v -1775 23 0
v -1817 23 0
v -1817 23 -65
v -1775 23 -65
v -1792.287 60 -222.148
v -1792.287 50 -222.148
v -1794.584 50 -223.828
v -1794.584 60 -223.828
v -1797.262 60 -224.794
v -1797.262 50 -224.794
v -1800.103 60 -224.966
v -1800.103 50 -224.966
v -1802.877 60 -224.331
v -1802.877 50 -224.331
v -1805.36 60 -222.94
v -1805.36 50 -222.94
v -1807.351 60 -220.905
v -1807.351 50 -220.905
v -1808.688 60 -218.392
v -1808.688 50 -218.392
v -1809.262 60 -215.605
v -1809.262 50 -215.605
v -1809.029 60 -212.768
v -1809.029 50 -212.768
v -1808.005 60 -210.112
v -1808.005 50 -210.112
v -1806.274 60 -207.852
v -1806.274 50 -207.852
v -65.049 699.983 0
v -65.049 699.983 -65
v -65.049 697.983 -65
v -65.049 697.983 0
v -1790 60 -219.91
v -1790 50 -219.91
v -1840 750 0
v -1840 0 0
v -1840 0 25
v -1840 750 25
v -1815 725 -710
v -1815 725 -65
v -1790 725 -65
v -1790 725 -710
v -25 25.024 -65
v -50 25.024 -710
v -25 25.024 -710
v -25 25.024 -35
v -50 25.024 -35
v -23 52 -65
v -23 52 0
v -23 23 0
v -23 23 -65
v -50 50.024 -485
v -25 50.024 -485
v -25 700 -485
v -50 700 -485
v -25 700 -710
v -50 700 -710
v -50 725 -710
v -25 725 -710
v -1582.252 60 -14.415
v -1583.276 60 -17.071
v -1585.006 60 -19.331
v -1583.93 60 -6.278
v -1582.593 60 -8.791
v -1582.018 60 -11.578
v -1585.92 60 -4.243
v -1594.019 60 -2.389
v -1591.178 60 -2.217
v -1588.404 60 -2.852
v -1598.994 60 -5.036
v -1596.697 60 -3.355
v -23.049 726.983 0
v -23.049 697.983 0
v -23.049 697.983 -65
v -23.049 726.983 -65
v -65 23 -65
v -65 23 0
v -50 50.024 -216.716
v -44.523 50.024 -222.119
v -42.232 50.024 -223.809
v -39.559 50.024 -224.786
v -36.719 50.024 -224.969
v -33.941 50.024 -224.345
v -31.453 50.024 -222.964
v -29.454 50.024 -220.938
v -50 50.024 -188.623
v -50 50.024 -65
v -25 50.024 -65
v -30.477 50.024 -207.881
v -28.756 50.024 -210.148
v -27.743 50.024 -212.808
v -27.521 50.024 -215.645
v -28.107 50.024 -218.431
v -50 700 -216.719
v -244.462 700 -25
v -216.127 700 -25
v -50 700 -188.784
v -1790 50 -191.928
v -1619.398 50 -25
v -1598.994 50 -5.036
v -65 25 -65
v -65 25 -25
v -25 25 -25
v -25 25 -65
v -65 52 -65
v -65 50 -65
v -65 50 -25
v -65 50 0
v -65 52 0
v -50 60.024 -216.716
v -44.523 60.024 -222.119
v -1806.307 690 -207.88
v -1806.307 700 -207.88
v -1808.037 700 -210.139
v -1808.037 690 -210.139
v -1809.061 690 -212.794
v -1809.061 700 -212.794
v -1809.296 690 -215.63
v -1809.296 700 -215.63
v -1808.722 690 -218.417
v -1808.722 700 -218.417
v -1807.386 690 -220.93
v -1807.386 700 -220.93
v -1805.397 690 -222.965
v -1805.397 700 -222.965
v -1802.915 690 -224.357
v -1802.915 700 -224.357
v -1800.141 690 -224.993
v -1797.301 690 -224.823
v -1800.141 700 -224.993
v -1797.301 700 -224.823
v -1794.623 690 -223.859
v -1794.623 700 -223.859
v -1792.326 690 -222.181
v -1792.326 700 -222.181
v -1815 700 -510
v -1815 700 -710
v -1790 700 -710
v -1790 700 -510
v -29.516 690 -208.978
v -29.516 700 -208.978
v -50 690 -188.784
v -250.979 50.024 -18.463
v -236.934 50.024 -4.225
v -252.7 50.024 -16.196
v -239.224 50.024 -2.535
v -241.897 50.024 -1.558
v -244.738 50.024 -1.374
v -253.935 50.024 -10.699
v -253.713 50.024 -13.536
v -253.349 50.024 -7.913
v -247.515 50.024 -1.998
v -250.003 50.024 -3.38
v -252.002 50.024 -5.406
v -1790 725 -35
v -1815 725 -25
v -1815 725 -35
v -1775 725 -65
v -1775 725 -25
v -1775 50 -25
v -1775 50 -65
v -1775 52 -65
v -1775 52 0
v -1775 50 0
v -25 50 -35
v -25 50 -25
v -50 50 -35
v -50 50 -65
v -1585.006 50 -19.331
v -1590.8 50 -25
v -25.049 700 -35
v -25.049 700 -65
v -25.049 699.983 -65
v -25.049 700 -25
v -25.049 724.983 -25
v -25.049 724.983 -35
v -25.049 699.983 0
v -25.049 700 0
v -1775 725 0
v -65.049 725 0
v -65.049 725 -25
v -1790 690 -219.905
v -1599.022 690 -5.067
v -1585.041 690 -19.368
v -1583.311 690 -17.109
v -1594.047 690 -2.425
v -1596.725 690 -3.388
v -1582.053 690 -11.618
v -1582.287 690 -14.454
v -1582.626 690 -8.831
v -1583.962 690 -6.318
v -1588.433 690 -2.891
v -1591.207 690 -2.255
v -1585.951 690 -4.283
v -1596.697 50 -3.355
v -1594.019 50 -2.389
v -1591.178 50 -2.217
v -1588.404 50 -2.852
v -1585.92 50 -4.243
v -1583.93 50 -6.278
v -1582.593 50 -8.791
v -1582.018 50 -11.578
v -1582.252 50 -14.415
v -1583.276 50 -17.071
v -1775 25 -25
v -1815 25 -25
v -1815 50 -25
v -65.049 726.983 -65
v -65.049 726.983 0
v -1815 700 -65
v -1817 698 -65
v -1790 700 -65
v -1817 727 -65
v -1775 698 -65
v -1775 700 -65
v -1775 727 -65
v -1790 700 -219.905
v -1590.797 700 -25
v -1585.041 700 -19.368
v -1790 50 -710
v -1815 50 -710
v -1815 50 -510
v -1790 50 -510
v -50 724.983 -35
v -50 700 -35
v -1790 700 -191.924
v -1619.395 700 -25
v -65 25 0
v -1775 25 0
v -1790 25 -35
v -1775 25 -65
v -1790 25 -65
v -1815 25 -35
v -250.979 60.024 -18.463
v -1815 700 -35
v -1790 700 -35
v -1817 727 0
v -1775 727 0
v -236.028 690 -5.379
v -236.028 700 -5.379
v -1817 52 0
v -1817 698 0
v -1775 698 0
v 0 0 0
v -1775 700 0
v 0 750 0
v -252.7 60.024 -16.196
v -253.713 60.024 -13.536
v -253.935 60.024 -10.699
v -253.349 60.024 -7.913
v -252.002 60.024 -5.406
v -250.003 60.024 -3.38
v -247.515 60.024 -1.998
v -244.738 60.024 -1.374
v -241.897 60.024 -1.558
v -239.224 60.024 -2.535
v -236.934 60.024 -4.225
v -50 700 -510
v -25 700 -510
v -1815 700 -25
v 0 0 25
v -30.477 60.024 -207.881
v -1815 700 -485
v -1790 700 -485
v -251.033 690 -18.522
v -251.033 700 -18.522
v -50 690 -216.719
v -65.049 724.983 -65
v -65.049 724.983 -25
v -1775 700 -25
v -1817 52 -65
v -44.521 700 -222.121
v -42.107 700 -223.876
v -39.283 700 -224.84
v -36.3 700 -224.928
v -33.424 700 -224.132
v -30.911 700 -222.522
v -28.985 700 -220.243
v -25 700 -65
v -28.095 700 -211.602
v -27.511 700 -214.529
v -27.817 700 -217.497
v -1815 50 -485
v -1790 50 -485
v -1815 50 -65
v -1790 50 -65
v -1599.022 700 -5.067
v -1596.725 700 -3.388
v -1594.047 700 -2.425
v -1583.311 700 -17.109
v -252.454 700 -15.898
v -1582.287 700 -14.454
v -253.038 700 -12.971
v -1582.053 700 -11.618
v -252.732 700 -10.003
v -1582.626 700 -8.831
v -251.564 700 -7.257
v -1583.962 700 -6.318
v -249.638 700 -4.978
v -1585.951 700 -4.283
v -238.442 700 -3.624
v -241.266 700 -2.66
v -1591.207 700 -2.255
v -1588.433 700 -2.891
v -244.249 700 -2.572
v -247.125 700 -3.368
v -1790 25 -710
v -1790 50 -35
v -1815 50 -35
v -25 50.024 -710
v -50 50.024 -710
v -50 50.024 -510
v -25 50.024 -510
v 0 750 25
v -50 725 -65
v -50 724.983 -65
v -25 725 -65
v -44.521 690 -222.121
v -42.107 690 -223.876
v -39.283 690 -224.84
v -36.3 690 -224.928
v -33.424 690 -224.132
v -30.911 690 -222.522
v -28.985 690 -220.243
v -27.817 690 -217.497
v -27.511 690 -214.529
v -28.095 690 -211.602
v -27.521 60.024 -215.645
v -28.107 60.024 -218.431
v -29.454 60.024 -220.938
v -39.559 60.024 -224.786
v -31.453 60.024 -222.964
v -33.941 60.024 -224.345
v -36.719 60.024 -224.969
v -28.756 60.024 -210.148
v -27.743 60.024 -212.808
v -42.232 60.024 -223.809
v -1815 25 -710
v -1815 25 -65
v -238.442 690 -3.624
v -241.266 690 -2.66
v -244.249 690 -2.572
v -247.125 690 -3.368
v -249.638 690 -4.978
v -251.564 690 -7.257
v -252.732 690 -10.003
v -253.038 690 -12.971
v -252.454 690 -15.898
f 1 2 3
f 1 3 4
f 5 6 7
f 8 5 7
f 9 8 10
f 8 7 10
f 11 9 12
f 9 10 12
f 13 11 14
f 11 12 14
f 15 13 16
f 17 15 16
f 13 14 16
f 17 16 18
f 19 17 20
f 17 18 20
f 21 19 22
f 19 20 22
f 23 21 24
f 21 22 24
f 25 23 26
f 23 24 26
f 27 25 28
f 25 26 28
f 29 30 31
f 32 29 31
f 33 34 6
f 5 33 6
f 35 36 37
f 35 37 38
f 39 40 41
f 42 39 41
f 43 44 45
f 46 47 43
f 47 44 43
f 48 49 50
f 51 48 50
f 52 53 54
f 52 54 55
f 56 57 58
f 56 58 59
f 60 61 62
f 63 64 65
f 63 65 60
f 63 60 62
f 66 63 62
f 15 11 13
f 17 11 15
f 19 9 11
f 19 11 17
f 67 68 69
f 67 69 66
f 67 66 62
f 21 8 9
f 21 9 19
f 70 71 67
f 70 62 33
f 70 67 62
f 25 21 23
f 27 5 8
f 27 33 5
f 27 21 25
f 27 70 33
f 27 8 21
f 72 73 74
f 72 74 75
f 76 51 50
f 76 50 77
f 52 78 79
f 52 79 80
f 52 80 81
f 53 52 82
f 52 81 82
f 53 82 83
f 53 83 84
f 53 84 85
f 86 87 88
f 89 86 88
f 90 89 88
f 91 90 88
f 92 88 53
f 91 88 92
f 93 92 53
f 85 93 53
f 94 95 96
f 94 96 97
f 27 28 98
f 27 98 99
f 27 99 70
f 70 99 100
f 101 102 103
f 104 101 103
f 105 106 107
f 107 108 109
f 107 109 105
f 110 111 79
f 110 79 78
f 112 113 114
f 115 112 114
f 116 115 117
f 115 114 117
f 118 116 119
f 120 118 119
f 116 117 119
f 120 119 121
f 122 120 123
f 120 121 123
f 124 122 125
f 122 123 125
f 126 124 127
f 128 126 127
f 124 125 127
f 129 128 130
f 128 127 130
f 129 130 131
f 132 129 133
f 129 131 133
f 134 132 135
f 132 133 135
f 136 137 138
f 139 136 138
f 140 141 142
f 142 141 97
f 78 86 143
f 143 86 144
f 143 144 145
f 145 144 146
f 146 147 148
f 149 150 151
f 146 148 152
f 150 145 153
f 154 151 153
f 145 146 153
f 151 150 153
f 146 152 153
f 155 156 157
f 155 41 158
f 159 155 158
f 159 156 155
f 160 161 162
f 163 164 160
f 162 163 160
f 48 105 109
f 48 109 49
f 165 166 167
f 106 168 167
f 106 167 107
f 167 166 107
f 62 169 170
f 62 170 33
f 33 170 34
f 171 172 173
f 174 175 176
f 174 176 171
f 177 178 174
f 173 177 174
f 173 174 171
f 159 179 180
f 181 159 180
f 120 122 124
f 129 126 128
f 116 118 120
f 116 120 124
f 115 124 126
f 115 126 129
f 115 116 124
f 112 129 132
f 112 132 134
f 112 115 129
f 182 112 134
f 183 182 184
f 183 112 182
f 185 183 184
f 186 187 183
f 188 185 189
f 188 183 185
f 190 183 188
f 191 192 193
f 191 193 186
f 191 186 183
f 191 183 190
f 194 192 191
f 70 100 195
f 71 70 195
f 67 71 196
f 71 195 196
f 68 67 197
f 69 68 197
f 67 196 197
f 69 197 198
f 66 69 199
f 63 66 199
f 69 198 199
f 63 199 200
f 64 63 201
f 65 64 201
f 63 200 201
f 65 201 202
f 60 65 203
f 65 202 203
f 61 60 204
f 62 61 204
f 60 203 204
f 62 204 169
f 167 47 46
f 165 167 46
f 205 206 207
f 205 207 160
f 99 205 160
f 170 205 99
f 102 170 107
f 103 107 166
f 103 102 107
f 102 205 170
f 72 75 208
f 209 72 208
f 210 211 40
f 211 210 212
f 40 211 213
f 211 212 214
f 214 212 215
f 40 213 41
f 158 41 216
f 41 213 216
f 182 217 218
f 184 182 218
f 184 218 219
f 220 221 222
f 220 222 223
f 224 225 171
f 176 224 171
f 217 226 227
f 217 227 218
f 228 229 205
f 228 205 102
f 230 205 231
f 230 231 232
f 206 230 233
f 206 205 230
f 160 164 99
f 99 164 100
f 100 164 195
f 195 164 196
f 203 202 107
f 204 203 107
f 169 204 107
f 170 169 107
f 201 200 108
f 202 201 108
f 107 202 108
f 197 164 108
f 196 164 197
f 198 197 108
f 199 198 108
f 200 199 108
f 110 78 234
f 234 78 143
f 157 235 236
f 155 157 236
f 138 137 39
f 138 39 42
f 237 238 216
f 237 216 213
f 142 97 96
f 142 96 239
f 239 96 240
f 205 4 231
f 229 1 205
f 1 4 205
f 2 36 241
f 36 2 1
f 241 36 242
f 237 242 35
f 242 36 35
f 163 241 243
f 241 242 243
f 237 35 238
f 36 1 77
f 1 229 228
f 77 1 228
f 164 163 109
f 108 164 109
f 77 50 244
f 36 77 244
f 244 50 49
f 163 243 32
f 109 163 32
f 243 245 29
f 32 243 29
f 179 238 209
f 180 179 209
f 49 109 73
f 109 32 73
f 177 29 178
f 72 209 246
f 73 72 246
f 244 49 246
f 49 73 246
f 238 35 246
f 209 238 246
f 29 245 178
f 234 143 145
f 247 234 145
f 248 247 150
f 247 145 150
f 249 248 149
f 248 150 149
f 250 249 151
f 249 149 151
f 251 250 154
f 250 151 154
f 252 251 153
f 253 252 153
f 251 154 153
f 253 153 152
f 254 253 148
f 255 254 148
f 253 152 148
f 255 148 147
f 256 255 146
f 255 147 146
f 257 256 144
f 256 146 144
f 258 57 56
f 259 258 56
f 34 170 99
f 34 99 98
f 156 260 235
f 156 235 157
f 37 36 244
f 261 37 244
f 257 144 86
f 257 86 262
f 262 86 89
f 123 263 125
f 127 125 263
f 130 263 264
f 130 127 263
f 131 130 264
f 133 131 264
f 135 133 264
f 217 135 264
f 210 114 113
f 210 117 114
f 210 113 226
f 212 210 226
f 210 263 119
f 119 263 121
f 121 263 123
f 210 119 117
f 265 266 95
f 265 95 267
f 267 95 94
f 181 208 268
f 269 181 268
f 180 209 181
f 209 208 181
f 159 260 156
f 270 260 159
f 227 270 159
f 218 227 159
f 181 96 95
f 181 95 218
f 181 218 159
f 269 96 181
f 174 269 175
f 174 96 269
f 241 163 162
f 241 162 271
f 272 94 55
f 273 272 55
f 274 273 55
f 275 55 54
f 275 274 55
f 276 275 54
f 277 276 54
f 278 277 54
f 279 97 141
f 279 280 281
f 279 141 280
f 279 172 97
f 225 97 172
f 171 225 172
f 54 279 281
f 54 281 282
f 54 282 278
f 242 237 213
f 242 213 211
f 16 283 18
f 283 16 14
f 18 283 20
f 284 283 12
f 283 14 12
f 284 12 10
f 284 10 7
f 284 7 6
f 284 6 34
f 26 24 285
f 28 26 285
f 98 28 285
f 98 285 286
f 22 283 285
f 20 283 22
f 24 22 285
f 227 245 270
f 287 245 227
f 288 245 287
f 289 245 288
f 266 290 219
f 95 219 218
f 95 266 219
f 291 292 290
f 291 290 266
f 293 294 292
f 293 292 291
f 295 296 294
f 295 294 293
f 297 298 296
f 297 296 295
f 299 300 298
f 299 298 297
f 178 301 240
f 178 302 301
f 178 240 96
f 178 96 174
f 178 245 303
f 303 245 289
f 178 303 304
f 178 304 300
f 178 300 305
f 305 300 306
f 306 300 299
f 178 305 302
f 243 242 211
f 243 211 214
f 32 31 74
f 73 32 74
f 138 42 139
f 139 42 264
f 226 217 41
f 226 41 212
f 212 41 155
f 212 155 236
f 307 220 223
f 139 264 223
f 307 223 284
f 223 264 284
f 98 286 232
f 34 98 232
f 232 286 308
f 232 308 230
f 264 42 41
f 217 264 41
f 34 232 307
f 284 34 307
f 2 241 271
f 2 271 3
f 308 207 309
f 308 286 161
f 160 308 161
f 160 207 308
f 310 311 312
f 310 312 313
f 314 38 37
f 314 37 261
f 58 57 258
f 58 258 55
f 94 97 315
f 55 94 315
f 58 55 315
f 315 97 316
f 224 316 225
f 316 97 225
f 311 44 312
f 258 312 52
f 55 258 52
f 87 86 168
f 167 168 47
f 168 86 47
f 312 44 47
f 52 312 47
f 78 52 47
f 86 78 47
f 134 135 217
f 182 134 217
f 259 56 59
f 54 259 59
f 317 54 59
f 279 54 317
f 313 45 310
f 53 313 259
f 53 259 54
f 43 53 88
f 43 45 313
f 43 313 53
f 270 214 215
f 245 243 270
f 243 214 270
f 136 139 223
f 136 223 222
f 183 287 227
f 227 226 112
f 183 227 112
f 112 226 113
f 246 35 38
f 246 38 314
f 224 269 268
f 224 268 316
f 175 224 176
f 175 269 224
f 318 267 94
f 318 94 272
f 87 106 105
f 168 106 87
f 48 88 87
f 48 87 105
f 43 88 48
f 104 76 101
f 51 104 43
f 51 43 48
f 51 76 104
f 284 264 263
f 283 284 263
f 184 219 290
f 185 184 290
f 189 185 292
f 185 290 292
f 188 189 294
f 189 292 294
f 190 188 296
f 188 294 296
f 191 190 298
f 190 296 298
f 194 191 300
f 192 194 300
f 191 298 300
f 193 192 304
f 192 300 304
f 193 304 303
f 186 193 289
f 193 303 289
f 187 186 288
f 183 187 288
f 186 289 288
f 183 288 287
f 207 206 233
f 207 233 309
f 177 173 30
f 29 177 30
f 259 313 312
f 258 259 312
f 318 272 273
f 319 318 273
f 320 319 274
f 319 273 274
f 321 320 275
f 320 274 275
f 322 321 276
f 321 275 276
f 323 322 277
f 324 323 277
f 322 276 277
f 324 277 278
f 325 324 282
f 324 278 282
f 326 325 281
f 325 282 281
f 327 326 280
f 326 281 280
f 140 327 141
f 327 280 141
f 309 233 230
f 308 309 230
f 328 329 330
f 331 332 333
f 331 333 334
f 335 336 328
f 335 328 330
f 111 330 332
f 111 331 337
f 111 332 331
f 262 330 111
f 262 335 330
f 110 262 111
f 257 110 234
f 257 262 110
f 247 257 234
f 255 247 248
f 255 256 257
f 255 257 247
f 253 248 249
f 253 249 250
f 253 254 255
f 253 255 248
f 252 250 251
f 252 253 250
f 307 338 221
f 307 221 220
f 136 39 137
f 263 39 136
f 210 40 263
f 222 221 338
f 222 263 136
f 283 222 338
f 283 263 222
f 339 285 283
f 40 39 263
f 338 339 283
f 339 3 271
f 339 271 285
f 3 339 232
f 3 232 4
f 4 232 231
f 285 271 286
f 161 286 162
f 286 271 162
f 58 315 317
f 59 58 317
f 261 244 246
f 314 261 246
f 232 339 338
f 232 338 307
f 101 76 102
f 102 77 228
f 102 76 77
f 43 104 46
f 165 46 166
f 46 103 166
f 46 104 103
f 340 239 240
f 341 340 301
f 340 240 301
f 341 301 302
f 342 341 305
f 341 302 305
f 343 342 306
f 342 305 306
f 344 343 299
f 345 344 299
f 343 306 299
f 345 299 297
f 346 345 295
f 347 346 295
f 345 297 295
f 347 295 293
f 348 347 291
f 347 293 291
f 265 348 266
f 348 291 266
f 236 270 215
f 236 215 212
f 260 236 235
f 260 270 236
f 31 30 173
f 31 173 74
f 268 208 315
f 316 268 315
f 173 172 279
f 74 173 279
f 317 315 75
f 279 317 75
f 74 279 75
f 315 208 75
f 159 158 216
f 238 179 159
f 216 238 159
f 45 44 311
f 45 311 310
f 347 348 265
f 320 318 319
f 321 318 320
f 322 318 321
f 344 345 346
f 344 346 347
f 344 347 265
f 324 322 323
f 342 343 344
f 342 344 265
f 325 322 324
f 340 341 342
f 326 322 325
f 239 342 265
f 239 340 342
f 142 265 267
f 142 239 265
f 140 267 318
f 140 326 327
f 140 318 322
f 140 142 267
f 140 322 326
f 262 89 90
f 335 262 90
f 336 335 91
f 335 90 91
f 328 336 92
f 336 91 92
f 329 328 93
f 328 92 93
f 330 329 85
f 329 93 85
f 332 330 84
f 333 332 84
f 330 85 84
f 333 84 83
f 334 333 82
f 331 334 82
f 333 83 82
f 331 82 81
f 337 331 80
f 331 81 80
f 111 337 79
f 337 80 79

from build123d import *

# Parameters (mm, degrees)
F0_W      = 1840
F0_H      = 750
F1_DEPTH  = 25
F2_W      = 1790
F2_H      = 25
F3_DEPTH  = 25
F5_DEPTH  = 65
F7_W      = 25
F7_H      = 25
F8_DEPTH  = 675
F10_DEPTH = 65
F12_W     = 25
F12_H     = 25
F13_DEPTH = 675
F15_W     = 25
F15_H     = 25
F16_DEPTH = 675
F18_W     = 25
F18_H     = 25
F19_DEPTH = 650
F21_W     = 25
F21_H     = 25
F22_DEPTH = 650
F24_DEPTH = 10
F26_DEPTH = 10
F28_DEPTH = 10
F30_DEPTH = 10


with BuildPart() as f1:
    # F0 (on Top) → F1 (new body)
    with BuildSketch(Plane.XY):
        with Locations((-920, 375)):
            Rectangle(F0_W, F0_H)
    extrude(amount=F1_DEPTH)

    # F2 (on face) → F3 (join)
    with BuildSketch(Plane(origin=(0, 0, 0), x_dir=(1, 0, 0), z_dir=(0, 0, -1))):
        with Locations((-920, -37.5)):
            Rectangle(F2_W, F2_H)
        with Locations((-920, -712.5)):
            Rectangle(F2_W, F2_H)
    extrude(amount=F3_DEPTH)

    # F4 (on face) → F5 (join)
    with BuildSketch(Plane(origin=(0, 0, 0), x_dir=(1, 0, 0), z_dir=(0, 0, -1))):
        Polygon((-65, -25), (-25, -25), (-25, -50), (-65, -50), (-65, -52), (-23, -52), (-23, -23), (-65, -23), align=None)
    extrude(amount=F5_DEPTH)

    # F7 (on offset) → F8 (join)
    with BuildSketch(Plane(origin=(0, 0, -35), x_dir=(1, 0, 0), z_dir=(0, 0, -1))):
        with Locations((-37.5, -37.523640207)):
            Rectangle(F7_W, F7_H)
    extrude(amount=F8_DEPTH)

    # F9 (on face) → F10 (join)
    with BuildSketch(Plane.XY):
        Polygon((-1815, 725), (-1775, 725), (-1775, 727), (-1817, 727), (-1817, 698), (-1775, 698), (-1775, 700), (-1815, 700), align=None)
        Polygon((-65.0490959734, 726.9829173088), (-65.0490959734, 724.9829173088), (-25.0490959734, 724.9829173088), (-25.0490959734, 699.9829173088), (-65.0490959734, 699.9829173088), (-65.0490959734, 697.9829173088), (-23.0490959734, 697.9829173088), (-23.0490959734, 726.9829173088), align=None)
        Polygon((-1775, 25), (-1815, 25), (-1815, 50), (-1775, 50), (-1775, 52), (-1817, 52), (-1817, 23), (-1775, 23), align=None)
    extrude(amount=-F10_DEPTH)

    # F12 (on offset) → F13 (join)
    with BuildSketch(Plane(origin=(0, 0, -35), x_dir=(1, 0, 0), z_dir=(0, 0, -1))):
        with Locations((-1802.5, -37.5)):
            Rectangle(F12_W, F12_H)
    extrude(amount=F13_DEPTH)

    # F15 (on offset) → F16 (join)
    with BuildSketch(Plane(origin=(0, 0, -35), x_dir=(1, 0, 0), z_dir=(0, 0, -1))):
        with Locations((-37.5, -712.5)):
            Rectangle(F15_W, F15_H)
        with Locations((-1802.5, -712.5)):
            Rectangle(F15_W, F15_H)
    extrude(amount=F16_DEPTH)

    # F18 (on offset) → F19 (join)
    with BuildSketch(Plane(origin=(0, 50.023640207, 0), x_dir=(-1, 0, 0), z_dir=(0, 1, 0))):
        with Locations((37.5, -497.5)):
            Rectangle(F18_W, F18_H)
    extrude(amount=F19_DEPTH)

    # F21 (on offset) → F22 (join)
    with BuildSketch(Plane(origin=(0, 50, 0), x_dir=(-1, 0, 0), z_dir=(0, 1, 0))):
        with Locations((1802.5, -497.5)):
            Rectangle(F21_W, F21_H)
    extrude(amount=F22_DEPTH)

    # F23 (on face) → F24 (join)
    with BuildSketch(Plane.XZ.offset(-700)):
        with BuildLine():
            Line((-50, -188.7835379987), (-236.028425198, -5.3788918093))
            ThreePointArc((-236.028425198, -5.3788918093), (-249.6380961216, -4.9776946987), (-251.0328083047, -18.5216557034))
            Line((-251.0328083047, -18.5216557034), (-50, -216.7190604298))
            Line((-50, -216.7190604298), (-50, -188.7835379987))
        make_face()
        with BuildLine():
            Line((-29.5162876687, -208.9783442966), (-50, -188.7835379987))
            Line((-50, -188.7835379987), (-50, -216.7190604298))
            Line((-50, -216.7190604298), (-44.5206707754, -222.1211081907))
            ThreePointArc((-44.5206707754, -222.1211081907), (-30.9109998517, -222.5223053013), (-29.5162876687, -208.9783442966))
        make_face()
    extrude(amount=F24_DEPTH)

    # F25 (on face) → F26 (join)
    with BuildSketch(Plane(origin=(0, 50.023640207, 0), x_dir=(-1, 0, 0), z_dir=(0, 1, 0))):
        with BuildLine():
            Line((50, -188.6229664357), (50, -216.7160920101))
            Line((50, -216.7160920101), (250.9788283543, -18.4630064225))
            ThreePointArc((250.9788283543, -18.4630064225), (251.07538107, -4.3212004002), (236.9335750477, -4.2246476845))
            Line((236.9335750477, -4.2246476845), (50, -188.6229664357))
        make_face()
        with BuildLine():
            ThreePointArc((30.4773733467, -207.880820631), (30.380820631, -222.0226266533), (44.5226266533, -222.119179369))
            Line((44.5226266533, -222.119179369), (50, -216.7160920101))
            Line((50, -216.7160920101), (50, -188.6229664357))
            Line((50, -188.6229664357), (30.4773733467, -207.880820631))
        make_face()
    extrude(amount=F26_DEPTH)

    # F27 (on face) → F28 (join)
    with BuildSketch(Plane(origin=(0, 50, 0), x_dir=(-1, 0, 0), z_dir=(0, 1, 0))):
        with BuildLine():
            ThreePointArc((1792.287088182, -222.1476128693), (1806.4283860793, -221.993685028), (1806.274458238, -207.8523871307))
            Line((1806.274458238, -207.8523871307), (1790, -191.9284084544))
            Line((1790, -191.9284084544), (1790, -219.9097784106))
            Line((1790, -219.9097784106), (1792.287088182, -222.1476128693))
        make_face()
        with BuildLine():
            Line((1790, -219.9097784106), (1790, -191.9284084544))
            Line((1790, -191.9284084544), (1598.993685028, -5.0355213195))
            ThreePointArc((1598.993685028, -5.0355213195), (1584.8523871307, -5.1894491609), (1585.006314972, -19.3307470582))
            Line((1585.006314972, -19.3307470582), (1790, -219.9097784106))
        make_face()
    extrude(amount=F28_DEPTH)

    # F29 (on face) → F30 (join)
    with BuildSketch(Plane.XZ.offset(-700)):
        with BuildLine():
            Line((-1599.022452861, -5.0670719967), (-1790, -191.924401237))
            Line((-1790, -191.924401237), (-1790, -219.9052243348))
            Line((-1790, -219.9052243348), (-1585.0408926577, -19.3679780711))
            ThreePointArc((-1585.0408926577, -19.3679780711), (-1584.8839824349, -5.2294459524), (-1599.022452861, -5.0670719967))
        make_face()
        with BuildLine():
            Line((-1790, -191.924401237), (-1806.3072462202, -207.8798290955))
            ThreePointArc((-1806.3072462202, -207.8798290955), (-1806.4641564431, -222.0183612143), (-1792.325686017, -222.1807351699))
            Line((-1792.325686017, -222.1807351699), (-1790, -219.9052243348))
            Line((-1790, -219.9052243348), (-1790, -191.924401237))
        make_face()
    extrude(amount=F30_DEPTH)


solid = f1.part
